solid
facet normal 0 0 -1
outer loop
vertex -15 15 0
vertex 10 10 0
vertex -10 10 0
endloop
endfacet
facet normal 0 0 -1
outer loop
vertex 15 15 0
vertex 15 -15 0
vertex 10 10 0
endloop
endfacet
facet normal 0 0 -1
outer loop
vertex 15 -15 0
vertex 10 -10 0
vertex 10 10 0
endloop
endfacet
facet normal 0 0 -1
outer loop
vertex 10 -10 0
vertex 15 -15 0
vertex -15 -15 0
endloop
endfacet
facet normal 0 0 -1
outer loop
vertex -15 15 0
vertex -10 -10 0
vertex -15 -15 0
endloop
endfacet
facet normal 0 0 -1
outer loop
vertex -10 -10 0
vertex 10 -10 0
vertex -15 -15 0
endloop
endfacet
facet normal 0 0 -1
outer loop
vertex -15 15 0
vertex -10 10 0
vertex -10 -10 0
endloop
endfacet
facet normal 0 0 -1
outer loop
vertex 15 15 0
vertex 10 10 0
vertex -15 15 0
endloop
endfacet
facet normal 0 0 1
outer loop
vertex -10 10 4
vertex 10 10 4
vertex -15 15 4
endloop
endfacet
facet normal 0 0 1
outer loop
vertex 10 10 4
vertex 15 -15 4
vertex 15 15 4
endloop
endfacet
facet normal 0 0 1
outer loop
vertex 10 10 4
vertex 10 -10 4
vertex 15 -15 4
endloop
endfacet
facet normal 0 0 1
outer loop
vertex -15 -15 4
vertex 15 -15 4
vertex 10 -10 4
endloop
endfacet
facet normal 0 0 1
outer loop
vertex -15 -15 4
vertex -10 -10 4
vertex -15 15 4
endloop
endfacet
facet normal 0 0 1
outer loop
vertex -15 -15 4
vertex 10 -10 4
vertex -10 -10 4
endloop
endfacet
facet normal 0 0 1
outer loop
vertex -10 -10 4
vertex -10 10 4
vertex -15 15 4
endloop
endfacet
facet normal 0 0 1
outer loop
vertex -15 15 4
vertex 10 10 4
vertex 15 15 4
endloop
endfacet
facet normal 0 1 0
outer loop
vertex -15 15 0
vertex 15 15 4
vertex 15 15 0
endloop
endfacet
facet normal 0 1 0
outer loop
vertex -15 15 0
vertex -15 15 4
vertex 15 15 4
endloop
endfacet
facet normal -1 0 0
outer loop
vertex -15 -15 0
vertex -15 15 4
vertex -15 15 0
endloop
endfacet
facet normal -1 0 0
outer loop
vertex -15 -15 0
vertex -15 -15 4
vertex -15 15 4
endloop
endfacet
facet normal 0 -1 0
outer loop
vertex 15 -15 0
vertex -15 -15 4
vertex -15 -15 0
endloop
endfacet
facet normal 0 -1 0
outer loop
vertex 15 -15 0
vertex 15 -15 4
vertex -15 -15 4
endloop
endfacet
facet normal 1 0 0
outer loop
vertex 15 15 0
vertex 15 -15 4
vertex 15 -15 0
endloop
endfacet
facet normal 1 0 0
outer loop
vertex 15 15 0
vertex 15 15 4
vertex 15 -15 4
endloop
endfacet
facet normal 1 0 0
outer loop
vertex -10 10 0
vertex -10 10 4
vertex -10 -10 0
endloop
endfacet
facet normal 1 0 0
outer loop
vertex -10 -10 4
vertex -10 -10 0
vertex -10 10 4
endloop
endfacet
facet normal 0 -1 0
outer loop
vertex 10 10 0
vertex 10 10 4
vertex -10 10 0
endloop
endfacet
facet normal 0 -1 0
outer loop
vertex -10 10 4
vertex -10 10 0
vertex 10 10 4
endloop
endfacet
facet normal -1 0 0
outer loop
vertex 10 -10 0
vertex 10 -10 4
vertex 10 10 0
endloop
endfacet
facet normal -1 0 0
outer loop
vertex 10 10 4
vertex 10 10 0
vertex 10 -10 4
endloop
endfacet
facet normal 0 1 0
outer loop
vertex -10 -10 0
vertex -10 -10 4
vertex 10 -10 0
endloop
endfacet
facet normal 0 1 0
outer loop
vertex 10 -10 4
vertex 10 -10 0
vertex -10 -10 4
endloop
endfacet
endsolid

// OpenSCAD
// the model's resolution
model_resolution = 50;

square_inlay_basis(
    size = 30,
    guide_height = 4,
    resolution = model_resolution);


// Hack a plunge router template using all parameters
// undef default values will be calculated/set automatically
module square_inlay_basis(
  size,   // the size for matching inlays
  height,  // the template guide's height
  resolution = model_resolution) {
    linear_extrude(height=guide_height) {
        difference() {
            // reduce outer size due to material expansion of frame
            square(size, center=true);
            square(size-10, center=true);
        }
    }
}
